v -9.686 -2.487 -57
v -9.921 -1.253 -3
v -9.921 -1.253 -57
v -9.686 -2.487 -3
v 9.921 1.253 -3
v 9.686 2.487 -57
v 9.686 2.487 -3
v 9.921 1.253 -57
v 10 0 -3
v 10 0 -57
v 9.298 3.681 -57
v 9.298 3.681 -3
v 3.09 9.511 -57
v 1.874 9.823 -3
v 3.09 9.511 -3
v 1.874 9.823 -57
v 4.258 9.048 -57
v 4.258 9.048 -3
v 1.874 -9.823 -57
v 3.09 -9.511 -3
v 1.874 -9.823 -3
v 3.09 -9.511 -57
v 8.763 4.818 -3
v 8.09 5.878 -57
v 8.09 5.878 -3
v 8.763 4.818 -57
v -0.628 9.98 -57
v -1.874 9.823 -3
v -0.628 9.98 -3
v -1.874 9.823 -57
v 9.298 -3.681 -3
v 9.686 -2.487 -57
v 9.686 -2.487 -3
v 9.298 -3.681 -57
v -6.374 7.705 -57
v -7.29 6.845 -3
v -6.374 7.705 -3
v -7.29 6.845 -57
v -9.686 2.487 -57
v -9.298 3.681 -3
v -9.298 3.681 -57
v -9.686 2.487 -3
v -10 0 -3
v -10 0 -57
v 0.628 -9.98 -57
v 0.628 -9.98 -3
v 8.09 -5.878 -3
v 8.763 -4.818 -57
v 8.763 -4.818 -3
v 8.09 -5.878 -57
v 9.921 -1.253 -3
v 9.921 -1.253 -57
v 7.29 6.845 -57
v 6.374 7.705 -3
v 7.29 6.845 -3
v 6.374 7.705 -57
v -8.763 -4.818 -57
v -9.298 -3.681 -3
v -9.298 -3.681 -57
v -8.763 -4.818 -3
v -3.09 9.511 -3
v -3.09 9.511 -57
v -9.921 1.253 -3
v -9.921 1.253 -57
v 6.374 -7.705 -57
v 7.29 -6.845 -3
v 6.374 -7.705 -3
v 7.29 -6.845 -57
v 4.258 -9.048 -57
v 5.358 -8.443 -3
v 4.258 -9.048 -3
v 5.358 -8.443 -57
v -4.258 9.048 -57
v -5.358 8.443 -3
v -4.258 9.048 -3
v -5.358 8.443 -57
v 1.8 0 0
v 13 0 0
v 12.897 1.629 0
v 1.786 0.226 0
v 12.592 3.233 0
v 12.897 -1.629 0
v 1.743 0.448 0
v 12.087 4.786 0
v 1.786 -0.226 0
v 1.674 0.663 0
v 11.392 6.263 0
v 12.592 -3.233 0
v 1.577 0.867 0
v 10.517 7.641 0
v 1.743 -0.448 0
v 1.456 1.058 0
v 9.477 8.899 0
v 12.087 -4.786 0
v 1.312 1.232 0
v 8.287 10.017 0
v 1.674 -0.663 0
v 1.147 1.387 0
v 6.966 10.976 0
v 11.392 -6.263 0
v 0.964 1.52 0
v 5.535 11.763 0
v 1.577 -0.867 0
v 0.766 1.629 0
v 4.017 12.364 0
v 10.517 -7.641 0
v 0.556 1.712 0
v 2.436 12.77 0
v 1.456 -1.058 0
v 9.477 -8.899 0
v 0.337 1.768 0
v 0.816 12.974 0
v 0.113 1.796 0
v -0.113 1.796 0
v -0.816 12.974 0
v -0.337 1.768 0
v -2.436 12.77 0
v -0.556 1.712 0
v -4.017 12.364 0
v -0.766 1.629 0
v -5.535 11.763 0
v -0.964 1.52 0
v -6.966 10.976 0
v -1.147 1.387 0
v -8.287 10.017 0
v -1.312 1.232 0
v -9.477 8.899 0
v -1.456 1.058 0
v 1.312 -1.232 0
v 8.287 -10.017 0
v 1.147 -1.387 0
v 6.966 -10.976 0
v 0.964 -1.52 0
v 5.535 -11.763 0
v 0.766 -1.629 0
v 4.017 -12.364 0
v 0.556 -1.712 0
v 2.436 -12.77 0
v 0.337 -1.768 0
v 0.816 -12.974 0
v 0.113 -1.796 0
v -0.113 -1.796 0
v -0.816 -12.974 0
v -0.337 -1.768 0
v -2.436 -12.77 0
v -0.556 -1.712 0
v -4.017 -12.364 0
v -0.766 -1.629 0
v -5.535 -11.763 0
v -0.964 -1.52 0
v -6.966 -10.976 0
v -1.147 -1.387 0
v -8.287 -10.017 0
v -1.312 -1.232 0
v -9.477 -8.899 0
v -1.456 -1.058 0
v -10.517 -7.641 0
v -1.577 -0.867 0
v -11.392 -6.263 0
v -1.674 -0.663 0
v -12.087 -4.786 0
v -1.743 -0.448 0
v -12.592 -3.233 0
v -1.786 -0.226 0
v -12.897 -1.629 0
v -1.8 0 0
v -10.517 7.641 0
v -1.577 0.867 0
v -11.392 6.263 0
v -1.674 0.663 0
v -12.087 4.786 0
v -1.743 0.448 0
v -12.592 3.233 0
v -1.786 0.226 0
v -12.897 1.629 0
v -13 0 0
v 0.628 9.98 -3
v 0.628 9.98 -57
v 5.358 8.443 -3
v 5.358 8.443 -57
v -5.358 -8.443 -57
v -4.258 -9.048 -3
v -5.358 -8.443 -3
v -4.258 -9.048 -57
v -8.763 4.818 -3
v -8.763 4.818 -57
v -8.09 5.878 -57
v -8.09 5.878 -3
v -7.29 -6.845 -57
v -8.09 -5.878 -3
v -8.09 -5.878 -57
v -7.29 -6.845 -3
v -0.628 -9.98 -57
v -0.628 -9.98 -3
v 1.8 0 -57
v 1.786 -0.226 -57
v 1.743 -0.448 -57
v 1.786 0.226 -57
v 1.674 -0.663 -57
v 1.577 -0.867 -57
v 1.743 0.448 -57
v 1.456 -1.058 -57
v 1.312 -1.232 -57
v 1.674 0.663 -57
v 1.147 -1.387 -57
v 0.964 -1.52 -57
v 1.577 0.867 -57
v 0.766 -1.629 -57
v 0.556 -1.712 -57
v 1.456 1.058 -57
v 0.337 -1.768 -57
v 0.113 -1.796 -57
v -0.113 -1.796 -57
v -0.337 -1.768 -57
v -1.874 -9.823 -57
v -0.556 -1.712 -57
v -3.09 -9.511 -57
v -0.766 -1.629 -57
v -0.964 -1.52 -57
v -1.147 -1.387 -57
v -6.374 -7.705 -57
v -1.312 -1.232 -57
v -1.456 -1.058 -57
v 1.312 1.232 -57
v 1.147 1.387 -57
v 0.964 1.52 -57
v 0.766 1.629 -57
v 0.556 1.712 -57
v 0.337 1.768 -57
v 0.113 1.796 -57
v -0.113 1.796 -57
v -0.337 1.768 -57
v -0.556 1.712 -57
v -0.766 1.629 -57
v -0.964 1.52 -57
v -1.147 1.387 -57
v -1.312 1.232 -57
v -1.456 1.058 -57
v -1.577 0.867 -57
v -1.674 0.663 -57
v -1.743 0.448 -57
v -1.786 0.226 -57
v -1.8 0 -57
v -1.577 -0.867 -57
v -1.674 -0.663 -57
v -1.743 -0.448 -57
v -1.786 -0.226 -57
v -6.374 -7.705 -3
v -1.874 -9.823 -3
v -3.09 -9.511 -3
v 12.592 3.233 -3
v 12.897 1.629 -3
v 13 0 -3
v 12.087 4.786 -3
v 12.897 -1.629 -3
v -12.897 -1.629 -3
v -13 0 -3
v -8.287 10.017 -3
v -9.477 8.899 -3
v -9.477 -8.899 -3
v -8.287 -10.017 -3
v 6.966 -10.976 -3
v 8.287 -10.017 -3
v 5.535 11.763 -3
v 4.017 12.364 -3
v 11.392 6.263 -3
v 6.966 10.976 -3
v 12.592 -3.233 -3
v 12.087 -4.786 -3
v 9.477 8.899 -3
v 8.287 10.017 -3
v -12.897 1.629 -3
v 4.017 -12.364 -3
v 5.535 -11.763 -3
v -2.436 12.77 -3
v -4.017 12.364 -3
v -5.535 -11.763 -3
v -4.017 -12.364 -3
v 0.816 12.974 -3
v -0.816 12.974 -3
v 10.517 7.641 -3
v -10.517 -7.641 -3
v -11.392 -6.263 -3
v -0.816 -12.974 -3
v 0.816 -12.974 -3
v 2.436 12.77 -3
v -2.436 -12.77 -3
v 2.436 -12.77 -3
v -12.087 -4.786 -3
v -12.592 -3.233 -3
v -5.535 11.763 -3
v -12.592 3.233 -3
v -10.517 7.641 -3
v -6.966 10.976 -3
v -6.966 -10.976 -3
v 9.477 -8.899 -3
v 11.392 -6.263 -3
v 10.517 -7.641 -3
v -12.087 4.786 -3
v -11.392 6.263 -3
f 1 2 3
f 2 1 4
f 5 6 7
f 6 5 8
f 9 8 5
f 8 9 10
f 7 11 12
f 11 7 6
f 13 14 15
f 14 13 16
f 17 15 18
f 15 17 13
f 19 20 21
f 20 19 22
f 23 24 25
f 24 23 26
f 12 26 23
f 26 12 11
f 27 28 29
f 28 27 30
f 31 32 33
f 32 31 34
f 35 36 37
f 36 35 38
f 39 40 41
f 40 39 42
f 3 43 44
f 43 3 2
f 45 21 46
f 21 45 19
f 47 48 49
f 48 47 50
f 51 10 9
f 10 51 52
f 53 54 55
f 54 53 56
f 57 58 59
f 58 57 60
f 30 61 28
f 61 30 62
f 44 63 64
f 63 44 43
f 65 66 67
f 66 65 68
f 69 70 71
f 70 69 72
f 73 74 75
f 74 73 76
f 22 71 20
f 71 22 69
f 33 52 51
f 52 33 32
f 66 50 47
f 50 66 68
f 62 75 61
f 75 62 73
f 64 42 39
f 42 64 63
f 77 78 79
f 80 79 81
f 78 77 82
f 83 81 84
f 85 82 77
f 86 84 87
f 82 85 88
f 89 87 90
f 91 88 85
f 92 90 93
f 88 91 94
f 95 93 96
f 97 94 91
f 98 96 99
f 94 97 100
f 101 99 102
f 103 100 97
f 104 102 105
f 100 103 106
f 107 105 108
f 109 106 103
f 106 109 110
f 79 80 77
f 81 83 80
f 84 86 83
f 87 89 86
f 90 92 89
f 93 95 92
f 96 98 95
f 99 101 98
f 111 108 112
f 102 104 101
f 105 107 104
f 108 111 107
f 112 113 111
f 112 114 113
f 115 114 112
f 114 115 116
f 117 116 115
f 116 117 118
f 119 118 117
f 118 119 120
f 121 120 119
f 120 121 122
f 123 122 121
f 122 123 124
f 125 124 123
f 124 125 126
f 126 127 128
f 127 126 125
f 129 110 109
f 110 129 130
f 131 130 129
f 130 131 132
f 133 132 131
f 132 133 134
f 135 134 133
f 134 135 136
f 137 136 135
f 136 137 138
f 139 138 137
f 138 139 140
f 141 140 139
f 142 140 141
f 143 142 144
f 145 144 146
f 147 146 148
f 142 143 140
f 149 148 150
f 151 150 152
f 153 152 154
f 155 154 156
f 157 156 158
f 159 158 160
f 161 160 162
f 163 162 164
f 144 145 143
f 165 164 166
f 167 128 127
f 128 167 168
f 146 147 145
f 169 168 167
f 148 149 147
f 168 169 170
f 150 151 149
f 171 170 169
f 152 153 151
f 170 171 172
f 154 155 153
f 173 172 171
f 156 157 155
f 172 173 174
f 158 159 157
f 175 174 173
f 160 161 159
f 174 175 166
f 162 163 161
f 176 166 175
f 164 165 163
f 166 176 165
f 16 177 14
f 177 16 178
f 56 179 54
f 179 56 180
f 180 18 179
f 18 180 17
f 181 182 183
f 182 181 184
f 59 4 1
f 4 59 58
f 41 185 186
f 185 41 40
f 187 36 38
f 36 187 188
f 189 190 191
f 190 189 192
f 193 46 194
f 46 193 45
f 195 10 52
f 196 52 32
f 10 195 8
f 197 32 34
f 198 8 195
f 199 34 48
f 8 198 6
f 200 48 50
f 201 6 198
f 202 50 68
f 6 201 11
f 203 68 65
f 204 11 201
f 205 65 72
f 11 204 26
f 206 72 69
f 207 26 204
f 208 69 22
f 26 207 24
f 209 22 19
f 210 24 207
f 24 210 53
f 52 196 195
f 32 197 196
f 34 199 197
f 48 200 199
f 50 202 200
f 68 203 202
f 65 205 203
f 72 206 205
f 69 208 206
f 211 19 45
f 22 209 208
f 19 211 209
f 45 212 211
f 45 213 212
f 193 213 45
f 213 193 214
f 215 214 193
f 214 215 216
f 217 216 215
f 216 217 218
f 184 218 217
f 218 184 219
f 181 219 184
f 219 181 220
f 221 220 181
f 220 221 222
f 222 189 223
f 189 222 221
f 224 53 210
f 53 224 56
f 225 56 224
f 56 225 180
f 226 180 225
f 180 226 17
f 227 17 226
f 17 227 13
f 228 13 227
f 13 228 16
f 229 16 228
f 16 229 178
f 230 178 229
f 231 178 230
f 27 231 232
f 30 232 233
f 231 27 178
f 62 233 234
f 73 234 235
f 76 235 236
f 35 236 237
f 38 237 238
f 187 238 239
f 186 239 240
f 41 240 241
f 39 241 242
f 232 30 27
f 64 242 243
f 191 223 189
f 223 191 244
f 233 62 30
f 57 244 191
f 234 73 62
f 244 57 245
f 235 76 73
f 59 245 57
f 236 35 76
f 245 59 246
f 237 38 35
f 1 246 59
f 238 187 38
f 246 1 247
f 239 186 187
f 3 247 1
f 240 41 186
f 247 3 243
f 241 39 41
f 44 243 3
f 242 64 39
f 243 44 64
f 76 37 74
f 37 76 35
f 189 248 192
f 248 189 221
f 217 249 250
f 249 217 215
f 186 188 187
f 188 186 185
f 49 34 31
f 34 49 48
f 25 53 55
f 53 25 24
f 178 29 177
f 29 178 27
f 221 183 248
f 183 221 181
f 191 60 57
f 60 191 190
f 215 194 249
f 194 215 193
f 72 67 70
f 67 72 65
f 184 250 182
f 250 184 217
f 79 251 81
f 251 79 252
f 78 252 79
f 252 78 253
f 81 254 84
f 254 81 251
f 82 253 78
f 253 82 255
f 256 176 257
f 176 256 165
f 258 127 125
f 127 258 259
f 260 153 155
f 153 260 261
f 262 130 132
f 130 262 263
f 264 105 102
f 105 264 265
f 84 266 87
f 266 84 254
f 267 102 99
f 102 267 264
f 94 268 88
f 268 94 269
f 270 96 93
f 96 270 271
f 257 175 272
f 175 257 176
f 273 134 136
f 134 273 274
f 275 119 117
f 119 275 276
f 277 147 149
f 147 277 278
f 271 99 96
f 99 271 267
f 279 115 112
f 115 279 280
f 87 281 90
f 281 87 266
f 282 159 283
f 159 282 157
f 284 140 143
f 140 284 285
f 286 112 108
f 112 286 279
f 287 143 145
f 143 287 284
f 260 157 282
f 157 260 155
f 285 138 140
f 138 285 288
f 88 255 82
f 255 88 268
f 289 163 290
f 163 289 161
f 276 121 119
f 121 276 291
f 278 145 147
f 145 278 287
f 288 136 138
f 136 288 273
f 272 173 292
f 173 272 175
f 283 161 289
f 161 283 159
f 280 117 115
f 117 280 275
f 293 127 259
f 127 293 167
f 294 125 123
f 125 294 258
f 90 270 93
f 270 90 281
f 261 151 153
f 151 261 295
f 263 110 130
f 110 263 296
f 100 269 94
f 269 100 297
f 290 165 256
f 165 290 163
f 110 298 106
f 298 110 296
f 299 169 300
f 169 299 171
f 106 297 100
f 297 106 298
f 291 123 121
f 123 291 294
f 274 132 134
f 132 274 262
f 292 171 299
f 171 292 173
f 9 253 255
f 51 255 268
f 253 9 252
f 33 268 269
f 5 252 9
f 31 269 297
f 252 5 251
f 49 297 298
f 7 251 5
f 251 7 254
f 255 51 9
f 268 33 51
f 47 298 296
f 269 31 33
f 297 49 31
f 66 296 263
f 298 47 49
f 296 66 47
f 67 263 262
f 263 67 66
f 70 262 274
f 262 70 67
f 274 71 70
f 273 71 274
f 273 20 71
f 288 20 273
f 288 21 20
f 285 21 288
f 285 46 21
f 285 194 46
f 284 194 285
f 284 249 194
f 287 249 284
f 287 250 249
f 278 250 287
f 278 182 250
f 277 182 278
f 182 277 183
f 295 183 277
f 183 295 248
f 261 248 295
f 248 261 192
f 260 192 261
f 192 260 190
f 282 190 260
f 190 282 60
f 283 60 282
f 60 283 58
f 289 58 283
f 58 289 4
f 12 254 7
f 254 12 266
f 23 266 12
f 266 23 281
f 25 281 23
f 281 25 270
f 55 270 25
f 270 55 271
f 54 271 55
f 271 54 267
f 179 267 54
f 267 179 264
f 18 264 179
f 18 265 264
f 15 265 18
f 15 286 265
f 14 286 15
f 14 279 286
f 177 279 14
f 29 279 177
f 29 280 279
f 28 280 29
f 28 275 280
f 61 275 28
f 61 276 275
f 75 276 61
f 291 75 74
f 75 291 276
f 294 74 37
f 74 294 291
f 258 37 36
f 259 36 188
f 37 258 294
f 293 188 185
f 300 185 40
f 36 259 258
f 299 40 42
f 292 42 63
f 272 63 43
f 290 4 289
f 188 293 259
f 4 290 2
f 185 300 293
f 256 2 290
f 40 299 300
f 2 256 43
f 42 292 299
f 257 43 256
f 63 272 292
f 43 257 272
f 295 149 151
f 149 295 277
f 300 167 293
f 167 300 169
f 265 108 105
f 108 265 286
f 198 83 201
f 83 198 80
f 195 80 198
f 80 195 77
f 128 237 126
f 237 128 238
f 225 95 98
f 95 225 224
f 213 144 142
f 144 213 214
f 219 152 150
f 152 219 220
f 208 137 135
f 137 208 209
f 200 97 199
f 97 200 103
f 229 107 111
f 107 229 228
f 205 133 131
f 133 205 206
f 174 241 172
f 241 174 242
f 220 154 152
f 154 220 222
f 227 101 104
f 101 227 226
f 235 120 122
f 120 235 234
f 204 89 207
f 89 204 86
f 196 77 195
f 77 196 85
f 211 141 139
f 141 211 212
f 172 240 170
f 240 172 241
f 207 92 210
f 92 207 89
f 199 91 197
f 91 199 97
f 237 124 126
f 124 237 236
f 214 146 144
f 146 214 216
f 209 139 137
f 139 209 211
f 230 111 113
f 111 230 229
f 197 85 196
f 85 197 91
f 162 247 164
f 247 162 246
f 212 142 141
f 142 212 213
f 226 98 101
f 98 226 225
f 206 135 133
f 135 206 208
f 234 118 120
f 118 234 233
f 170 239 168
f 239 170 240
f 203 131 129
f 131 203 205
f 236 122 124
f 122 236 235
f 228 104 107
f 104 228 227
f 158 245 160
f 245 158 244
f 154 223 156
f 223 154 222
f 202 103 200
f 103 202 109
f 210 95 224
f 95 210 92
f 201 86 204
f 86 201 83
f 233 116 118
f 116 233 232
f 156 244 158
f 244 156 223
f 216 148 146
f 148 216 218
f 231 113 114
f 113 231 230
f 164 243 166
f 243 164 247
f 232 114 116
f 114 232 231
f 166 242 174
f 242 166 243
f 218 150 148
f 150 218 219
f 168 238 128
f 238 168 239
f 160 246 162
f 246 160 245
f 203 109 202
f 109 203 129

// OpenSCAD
$fn = 50;


difference() {
	union() {
		translate(v = [0, 0, -57.0000000000]) {
			cylinder(h = 57, r = 10.0000000000);
		}
		translate(v = [0, 0, -3.0000000000]) {
			cylinder(h = 3, r = 13.0000000000);
		}
	}
	union() {
		#translate(v = [0, 0, -57]) {
			cylinder(h = 57, r = 1.8000000000);
		}
	}
}
